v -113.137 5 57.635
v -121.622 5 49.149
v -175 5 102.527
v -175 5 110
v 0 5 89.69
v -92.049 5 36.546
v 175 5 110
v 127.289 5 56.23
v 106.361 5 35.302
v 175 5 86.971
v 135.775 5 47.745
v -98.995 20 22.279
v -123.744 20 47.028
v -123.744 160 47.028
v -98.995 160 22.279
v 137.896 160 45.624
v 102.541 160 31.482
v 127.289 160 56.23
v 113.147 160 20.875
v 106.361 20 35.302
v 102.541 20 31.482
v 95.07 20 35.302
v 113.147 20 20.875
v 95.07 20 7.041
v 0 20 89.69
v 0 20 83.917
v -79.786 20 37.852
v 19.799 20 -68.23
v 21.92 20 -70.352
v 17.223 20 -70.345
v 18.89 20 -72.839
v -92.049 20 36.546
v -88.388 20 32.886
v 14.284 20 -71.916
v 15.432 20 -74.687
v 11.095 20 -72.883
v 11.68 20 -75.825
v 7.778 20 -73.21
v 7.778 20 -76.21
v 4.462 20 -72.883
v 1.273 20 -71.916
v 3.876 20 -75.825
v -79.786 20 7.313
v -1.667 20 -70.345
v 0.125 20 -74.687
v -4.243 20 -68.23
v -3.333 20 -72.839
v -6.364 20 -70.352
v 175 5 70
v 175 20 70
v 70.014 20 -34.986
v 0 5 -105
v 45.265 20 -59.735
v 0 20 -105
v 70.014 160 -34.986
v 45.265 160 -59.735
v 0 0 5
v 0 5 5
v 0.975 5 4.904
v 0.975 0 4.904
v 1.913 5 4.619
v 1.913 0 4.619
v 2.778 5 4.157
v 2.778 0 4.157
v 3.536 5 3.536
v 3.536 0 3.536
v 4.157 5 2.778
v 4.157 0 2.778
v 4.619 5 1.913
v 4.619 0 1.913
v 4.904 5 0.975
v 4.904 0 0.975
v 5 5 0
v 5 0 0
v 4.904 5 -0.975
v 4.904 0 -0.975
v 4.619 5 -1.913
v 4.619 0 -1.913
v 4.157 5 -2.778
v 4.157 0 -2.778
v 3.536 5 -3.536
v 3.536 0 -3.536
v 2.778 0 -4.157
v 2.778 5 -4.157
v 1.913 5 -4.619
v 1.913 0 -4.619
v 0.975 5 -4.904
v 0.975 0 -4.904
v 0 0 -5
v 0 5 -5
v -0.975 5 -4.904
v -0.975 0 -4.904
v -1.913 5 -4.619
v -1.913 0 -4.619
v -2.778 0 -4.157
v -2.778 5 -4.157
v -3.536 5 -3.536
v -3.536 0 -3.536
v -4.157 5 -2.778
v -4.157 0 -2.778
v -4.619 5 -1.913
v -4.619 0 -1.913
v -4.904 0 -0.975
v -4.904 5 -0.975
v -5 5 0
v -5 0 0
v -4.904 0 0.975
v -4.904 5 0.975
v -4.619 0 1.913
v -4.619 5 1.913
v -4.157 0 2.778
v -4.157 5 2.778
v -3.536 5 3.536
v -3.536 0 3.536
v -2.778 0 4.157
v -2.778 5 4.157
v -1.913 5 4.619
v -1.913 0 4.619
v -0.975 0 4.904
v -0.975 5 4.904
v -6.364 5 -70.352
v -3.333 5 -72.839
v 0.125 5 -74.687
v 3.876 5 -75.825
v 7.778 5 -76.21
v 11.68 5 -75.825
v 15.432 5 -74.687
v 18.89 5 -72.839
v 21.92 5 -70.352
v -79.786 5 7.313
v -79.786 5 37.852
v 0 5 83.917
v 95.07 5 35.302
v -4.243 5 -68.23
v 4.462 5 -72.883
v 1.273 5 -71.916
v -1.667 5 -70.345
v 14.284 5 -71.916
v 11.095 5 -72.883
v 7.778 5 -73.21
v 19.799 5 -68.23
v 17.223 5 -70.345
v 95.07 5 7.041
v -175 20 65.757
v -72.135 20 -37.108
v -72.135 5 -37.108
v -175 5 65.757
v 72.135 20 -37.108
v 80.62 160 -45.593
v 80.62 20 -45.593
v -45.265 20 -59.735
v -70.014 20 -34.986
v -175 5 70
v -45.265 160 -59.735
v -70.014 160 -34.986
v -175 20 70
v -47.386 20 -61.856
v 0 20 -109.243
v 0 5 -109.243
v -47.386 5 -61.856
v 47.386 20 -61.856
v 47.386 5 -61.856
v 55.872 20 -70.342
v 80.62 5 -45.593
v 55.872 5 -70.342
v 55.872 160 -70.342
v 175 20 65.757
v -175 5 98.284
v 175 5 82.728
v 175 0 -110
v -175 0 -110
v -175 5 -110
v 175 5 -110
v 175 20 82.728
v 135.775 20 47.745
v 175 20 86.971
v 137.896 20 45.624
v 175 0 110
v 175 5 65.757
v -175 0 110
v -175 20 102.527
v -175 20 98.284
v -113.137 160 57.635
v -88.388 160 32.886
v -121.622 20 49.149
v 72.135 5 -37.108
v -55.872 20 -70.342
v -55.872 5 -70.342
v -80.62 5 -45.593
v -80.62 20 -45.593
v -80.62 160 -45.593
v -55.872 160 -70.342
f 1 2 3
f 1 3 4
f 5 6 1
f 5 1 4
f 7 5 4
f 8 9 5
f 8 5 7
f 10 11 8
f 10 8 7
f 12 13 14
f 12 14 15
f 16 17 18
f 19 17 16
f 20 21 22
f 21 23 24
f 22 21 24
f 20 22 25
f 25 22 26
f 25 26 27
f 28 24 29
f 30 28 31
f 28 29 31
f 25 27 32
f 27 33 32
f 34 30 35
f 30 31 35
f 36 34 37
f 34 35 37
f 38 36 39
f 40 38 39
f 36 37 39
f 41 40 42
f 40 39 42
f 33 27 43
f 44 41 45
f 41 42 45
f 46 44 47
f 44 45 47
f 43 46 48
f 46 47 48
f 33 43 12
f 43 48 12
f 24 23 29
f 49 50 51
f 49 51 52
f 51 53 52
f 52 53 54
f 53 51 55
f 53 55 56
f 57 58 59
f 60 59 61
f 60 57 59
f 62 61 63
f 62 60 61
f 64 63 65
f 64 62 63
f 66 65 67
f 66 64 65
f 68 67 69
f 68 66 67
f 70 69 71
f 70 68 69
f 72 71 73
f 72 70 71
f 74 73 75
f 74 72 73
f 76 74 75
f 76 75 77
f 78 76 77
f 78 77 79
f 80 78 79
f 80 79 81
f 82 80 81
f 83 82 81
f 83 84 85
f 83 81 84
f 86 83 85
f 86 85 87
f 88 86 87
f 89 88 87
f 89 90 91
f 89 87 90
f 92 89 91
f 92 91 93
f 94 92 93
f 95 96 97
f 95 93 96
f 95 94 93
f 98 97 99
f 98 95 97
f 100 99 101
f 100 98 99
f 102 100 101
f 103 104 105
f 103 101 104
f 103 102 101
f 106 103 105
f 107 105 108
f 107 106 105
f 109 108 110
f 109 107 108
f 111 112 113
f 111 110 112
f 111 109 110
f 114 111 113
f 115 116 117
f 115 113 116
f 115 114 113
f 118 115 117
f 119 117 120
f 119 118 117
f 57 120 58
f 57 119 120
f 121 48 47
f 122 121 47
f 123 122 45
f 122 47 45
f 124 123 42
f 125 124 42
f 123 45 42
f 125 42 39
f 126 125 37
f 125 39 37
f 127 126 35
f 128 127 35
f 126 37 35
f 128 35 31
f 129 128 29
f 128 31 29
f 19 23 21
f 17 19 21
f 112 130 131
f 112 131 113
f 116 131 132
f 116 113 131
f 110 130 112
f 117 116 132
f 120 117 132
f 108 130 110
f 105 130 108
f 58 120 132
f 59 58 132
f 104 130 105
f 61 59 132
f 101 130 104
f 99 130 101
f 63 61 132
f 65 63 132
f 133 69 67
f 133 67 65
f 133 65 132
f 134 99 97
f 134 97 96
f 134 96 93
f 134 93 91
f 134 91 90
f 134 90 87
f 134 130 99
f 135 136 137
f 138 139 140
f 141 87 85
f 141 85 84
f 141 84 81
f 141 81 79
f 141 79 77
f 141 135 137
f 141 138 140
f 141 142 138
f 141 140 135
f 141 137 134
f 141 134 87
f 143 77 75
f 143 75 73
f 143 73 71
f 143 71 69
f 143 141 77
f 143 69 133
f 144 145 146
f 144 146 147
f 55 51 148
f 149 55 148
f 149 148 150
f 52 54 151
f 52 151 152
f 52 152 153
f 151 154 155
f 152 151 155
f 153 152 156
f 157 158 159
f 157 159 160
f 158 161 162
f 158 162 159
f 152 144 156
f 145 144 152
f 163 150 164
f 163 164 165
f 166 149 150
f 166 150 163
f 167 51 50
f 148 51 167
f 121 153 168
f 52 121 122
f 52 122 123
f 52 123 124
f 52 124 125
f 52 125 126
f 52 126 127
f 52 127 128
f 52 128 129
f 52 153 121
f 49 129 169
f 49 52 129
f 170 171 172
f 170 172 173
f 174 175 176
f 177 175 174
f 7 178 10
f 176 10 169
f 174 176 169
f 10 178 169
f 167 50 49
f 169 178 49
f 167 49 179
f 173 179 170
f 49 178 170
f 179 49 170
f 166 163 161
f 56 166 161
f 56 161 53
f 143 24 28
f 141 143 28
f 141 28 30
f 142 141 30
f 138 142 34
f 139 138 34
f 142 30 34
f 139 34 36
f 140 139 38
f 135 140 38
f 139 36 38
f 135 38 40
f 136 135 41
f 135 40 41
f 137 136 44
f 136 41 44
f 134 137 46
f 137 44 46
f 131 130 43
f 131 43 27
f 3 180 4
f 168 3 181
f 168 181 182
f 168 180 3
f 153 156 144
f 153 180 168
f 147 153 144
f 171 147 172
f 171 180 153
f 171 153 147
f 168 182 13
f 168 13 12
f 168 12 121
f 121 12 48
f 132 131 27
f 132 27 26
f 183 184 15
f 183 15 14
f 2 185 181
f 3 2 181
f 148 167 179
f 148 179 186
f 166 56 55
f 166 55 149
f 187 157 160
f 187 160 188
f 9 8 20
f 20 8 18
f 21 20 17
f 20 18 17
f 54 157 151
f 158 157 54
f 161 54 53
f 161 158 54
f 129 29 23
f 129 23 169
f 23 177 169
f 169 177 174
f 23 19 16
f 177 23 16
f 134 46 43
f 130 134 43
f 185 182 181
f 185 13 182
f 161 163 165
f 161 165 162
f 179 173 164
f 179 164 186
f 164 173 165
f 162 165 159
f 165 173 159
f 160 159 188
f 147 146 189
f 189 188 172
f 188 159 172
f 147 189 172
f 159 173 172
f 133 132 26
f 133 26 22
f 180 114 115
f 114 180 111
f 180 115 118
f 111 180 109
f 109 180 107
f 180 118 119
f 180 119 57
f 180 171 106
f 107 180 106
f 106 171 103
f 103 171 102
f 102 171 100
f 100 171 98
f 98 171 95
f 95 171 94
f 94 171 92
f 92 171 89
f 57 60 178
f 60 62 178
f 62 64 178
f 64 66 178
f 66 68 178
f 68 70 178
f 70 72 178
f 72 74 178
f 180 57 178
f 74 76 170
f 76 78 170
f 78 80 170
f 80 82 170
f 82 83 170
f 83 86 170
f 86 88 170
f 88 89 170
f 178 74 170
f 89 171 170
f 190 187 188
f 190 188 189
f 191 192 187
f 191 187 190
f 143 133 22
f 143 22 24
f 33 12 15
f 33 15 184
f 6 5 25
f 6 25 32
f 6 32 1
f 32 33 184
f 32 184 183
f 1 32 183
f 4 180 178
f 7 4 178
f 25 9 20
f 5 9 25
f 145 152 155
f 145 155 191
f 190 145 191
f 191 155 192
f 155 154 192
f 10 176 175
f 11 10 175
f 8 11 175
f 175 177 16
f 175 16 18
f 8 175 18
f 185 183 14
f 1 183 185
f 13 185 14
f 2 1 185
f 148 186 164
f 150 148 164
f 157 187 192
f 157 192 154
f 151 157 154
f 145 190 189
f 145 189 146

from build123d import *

# Parameters (mm, degrees)
CROQUIS2_W              = 350
CROQUIS2_H              = 220
CROQUIS2_R              = 5
SALIENTE_EXTRUIR1_DEPTH = 20
CORTAR_EXTRUIR1_DEPTH   = 7
CORTAR_EXTRUIR3_DEPTH   = 15
SALIENTE_EXTRUIR3_DEPTH = 140
CORTAR_EXTRUIR4_DEPTH   = 15
SALIENTE_EXTRUIR4_DEPTH = 15


with BuildPart() as part:
    # Croquis2 → Saliente-Extruir1 (new body)
    with BuildSketch(Plane(origin=(0, 0, 0), x_dir=(1, 0, 0), z_dir=(0, 1, 0))):
        Rectangle(CROQUIS2_W, CROQUIS2_H)
        with Locations(Location((0, 0, 0), (0, 0, 270))):
            Circle(CROQUIS2_R, mode=Mode.SUBTRACT)
    extrude(amount=SALIENTE_EXTRUIR1_DEPTH)

    # Croquis3 → Cortar-Extruir1 (cut)
    with BuildSketch(Plane(origin=(0, 20, 0), x_dir=(1, 0, 0), z_dir=(0, 1, 0))):
        Polygon((-7.505553499, 0), (-3.75277675, -6.5), (3.75277675, -6.5), (7.505553499, 0), (3.75277675, 6.5), (-3.75277675, 6.5), align=None)
    extrude(amount=-CORTAR_EXTRUIR1_DEPTH, mode=Mode.SUBTRACT)

    # Croquis8 → Cortar-Extruir3 (cut)
    with BuildSketch(Plane(origin=(0, 20, 0), x_dir=(1, 0, 0), z_dir=(0, 1, 0))):
        with BuildLine():
            Line((21.920310217, 70.351767722), (175, -82.727922061))
            Line((175, -82.727922061), (175, -70))
            Line((175, -70), (0, 105))
            Line((0, 105), (-175, -70))
            Line((-175, -70), (-175, -98.284271247))
            Line((-175, -98.284271247), (-6.363961031, 70.351767722))
            ThreePointArc((-6.363961031, 70.351767722), (7.778174593, 76.209632098), (21.920310217, 70.351767722))
        make_face()
    extrude(amount=-CORTAR_EXTRUIR3_DEPTH, mode=Mode.SUBTRACT)

    # Croquis9 → Saliente-Extruir3 (add)
    with BuildSketch(Plane(origin=(0, 20, 0), x_dir=(1, 0, 0), z_dir=(0, 1, 0))):
        Polygon((-98.994949366, -22.279220614), (-88.388347648, -32.885822331), (-113.13708499, -57.634559673), (-123.743686708, -47.027957955), align=None)
        Polygon((-70.01365227, 34.98634773), (-80.620253988, 45.592949448), (-55.871516646, 70.34168679), (-45.264914928, 59.735085072), align=None)
        Polygon((45.264914928, 59.735085072), (70.01365227, 34.98634773), (80.620253988, 45.592949448), (55.871516646, 70.34168679), align=None)
        Polygon((113.147165922, -20.875087983), (102.540564204, -31.481689701), (127.289301546, -56.230427043), (137.895903264, -45.623825325), align=None)
    extrude(amount=SALIENTE_EXTRUIR3_DEPTH)

    # Croquis10 → Cortar-Extruir4 (cut)
    with BuildSketch(Plane(origin=(0, 20, 0), x_dir=(1, 0, 0), z_dir=(0, 1, 0))):
        Polygon((-175, -65.757359313), (-175, 110), (0, 110), (175, 110), (175, -65.757359313), (72.134972613, 37.107668074), (80.620253988, 45.592949448), (55.871516646, 70.34168679), (47.386235272, 61.856405415), (0, 109.242640687), (-47.386235272, 61.856405415), (-55.871516646, 70.34168679), (-80.620253988, 45.592949448), (-72.134972613, 37.107668074), align=None)
        with BuildLine():
            Line((-96.873629023, -24.400540957), (-88.388347648, -32.885822331))
            Line((-88.388347648, -32.885822331), (-113.13708499, -57.634559673))
            Line((-113.13708499, -57.634559673), (-121.622366364, -49.149278299))
            Line((-121.622366364, -49.149278299), (-175, -102.526911935))
            Line((-175, -102.526911935), (-175, -110))
            Line((-175, -110), (175, -110))
            Line((175, -110), (175, -86.970562748))
            Line((175, -86.970562748), (135.77458292, -47.745145669))
            Line((135.77458292, -47.745145669), (127.289301546, -56.230427043))
            Line((127.289301546, -56.230427043), (102.540564204, -31.481689701))
            Line((102.540564204, -31.481689701), (111.025845579, -22.996408327))
            Line((111.025845579, -22.996408327), (19.798989873, 68.230447378))
            ThreePointArc((19.798989873, 68.230447378), (7.778174593, 73.209632098), (-4.242640687, 68.230447378))
            Line((-4.242640687, 68.230447378), (-96.873629023, -24.400540957))
        make_face()
    extrude(amount=-CORTAR_EXTRUIR4_DEPTH, mode=Mode.SUBTRACT)

    # Croquis11 → Saliente-Extruir4 (add)
    with BuildSketch(Plane(origin=(0, 5, 0), x_dir=(1, 0, 0), z_dir=(0, 1, 0))):
        Polygon((95.070154737, -35.301760182), (95.070154737, -7.040717486), (111.025845579, -22.996408327), (102.540564204, -31.481689701), (106.360634685, -35.301760182), (0, -89.690361331), (-92.048601686, -36.546076369), (-88.388347648, -32.885822331), (-96.873629023, -24.400540957), (-79.786384853, -7.313296787), (-79.786384853, -37.852167867), (0, -83.916858639), align=None)
    extrude(amount=SALIENTE_EXTRUIR4_DEPTH)


solid = part.part
